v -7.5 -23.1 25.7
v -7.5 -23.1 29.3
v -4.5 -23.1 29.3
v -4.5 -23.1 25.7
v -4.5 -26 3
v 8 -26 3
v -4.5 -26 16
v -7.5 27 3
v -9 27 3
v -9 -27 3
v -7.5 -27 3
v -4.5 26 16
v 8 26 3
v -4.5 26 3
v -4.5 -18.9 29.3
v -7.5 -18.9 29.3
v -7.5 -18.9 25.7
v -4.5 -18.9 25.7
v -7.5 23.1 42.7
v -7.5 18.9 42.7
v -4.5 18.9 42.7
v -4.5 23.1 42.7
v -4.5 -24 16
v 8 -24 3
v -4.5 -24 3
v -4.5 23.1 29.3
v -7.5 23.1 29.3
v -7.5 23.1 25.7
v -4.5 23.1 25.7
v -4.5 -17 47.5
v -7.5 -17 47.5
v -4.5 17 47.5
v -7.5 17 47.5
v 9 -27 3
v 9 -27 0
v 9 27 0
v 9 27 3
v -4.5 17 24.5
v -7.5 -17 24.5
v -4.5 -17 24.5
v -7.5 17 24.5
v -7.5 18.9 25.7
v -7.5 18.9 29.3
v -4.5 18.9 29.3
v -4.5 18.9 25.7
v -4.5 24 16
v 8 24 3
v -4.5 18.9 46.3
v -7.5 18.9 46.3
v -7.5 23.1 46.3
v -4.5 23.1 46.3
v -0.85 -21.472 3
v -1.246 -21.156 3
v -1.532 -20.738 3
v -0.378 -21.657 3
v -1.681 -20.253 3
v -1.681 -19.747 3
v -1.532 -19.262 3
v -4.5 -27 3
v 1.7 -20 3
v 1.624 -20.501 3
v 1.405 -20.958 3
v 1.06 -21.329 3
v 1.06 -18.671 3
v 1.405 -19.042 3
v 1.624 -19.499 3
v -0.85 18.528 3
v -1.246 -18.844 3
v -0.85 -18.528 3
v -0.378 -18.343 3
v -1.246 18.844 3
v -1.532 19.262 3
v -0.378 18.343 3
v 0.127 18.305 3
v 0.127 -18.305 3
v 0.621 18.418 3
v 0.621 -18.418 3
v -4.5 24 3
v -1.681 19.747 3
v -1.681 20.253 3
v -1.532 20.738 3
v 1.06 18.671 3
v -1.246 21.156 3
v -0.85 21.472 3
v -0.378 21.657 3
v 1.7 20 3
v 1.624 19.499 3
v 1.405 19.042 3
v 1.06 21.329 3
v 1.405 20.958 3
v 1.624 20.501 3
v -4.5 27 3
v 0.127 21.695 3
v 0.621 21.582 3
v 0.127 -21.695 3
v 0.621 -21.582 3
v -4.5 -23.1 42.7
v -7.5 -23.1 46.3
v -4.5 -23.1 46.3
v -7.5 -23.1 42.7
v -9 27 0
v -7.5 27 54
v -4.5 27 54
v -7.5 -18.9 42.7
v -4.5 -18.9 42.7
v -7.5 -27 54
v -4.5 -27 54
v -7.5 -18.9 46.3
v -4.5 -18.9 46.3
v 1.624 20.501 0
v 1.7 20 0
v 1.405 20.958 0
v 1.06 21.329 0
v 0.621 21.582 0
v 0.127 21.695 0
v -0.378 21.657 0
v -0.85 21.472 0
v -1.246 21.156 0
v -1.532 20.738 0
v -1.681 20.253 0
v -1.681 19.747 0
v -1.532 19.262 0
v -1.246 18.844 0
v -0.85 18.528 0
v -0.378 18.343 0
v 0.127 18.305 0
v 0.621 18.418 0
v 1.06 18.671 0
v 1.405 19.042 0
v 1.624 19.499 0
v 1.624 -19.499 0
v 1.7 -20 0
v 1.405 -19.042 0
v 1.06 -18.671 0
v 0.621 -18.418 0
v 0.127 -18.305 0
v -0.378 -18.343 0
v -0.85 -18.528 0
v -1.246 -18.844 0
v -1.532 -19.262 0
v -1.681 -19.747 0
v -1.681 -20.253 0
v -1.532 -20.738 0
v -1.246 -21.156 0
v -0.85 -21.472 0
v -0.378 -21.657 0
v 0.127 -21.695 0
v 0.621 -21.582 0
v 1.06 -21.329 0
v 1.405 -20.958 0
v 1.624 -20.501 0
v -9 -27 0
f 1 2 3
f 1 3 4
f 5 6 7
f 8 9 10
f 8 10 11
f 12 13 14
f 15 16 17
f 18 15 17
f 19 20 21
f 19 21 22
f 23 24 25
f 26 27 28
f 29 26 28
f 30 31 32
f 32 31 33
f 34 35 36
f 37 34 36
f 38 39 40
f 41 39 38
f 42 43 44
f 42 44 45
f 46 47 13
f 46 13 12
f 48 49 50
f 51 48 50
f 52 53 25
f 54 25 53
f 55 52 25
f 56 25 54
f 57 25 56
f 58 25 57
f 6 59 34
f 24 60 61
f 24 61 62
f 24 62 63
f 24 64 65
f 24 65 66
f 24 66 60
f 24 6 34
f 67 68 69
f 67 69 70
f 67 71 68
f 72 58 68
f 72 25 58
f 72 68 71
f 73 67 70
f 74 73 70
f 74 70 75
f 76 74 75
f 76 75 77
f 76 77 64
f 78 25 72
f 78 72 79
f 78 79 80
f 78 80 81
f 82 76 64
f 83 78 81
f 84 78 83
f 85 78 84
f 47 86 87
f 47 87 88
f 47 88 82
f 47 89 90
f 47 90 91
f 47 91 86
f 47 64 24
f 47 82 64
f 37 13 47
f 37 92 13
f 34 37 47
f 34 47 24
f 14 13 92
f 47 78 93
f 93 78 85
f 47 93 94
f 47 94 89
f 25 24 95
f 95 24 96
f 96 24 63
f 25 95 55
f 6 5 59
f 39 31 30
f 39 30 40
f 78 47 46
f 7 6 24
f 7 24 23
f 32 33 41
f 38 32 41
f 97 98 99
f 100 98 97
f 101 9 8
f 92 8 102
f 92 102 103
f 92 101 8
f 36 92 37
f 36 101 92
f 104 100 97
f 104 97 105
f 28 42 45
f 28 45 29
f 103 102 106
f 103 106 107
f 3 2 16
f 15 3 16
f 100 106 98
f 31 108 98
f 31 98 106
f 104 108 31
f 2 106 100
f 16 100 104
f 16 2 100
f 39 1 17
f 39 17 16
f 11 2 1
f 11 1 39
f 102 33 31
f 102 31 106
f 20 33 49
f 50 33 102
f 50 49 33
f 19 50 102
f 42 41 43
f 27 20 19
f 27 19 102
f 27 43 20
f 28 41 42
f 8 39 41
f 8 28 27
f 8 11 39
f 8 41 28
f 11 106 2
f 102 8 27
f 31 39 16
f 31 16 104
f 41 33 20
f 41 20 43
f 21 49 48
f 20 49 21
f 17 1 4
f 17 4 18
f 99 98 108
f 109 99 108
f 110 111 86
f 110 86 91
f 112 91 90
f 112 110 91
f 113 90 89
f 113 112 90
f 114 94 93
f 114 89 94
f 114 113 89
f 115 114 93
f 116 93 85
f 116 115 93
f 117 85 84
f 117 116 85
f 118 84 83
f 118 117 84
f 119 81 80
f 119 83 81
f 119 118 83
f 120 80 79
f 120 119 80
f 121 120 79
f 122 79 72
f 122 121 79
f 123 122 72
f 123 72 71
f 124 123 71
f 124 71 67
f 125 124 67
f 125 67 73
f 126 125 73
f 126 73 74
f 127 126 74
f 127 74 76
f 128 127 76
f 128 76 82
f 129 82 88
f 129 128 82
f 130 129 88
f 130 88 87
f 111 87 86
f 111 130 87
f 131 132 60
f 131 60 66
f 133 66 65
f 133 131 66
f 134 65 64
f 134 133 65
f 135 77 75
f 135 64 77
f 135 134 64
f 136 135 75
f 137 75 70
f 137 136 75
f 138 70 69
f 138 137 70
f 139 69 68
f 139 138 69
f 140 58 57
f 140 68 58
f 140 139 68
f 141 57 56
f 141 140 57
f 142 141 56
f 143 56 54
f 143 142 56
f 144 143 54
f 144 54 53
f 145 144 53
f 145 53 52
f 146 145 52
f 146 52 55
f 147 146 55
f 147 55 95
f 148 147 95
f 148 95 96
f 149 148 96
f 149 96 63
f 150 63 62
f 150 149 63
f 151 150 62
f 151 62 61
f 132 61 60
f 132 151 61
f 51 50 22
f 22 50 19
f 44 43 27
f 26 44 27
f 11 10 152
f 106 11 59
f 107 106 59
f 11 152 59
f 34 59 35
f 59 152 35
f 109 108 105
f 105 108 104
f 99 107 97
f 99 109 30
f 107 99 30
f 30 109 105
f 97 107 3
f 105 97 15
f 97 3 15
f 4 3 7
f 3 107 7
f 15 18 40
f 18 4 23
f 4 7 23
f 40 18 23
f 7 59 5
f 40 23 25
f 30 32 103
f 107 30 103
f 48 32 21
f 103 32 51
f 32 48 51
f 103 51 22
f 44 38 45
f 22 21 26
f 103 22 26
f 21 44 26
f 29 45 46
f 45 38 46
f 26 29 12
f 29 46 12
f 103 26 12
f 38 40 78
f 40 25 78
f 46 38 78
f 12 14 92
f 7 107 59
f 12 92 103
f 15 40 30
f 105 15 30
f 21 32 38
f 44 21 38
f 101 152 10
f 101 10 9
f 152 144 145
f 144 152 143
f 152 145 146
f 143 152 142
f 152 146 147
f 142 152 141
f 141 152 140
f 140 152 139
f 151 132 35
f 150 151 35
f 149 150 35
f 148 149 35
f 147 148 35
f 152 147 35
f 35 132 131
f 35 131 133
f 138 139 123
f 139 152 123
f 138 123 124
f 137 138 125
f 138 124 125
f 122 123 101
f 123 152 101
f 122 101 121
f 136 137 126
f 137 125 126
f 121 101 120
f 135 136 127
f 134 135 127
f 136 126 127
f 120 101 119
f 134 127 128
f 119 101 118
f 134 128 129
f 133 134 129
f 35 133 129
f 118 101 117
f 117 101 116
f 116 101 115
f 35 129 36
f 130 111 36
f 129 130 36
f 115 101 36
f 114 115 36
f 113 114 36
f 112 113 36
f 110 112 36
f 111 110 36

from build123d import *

# Parameters (mm, degrees)
SKETCH_1_W                         = 18
SKETCH_1_H                         = 54
FOOT_DEPTH                         = 3
UPRIGHT_START                      = 3
SKETCH_2_W                         = 3
SKETCH_2_H                         = 54
UPRIGHT_DEPTH                      = 51
REAR_COMPONENTS_OPEN_WINDOW_START  = -8
SKETCH_3_W                         = 23
SKETCH_3_H                         = 34
REAR_COMPONENTS_OPEN_WINDOW_DEPTH  = 5
SENSOR_M2_SLOTS_CENTRES42X17_START = -8
SKETCH_4_W                         = 3.6
SKETCH_4_H                         = 4.2
SENSOR_M2_SLOTS_CENTRES42X17_DEPTH = 5
SIDE_GUSSET_START                  = -26
SIDE_GUSSET_DEPTH                  = 2
EXTRUDE_START                      = 24
EXTRUDE_4_DEPTH                    = 2
FOOT_M3_HOLES_PITCH40_START        = -0.1
SKETCH_7_R                         = 1.7
FOOT_M3_HOLES_PITCH40_DEPTH        = 3.2


with BuildPart() as part:
    # 草图1 → Foot (new body)
    with BuildSketch(Plane.XY):
        Rectangle(SKETCH_1_W, SKETCH_1_H)
    extrude(amount=FOOT_DEPTH)

    # 草图2 → Upright (add)
    with BuildSketch(Plane.XY.offset(UPRIGHT_START)):
        with Locations((-6, 0)):
            Rectangle(SKETCH_2_W, SKETCH_2_H)
    extrude(amount=UPRIGHT_DEPTH)

    # 草图3 → Rear_components_open_window (cut)
    with BuildSketch(Plane(origin=(0, 0, 0), x_dir=(0, 0, -1), z_dir=(1, 0, 0)).offset(REAR_COMPONENTS_OPEN_WINDOW_START)):
        with Locations((-36, 0)):
            Rectangle(SKETCH_3_W, SKETCH_3_H)
    extrude(amount=REAR_COMPONENTS_OPEN_WINDOW_DEPTH, mode=Mode.SUBTRACT)

    # 草图4 → Sensor_M2_slots_centres42x17 (cut)
    with BuildSketch(Plane(origin=(0, 0, 0), x_dir=(0, 0, -1), z_dir=(1, 0, 0)).offset(SENSOR_M2_SLOTS_CENTRES42X17_START)):
        with Locations((-27.5, -21)):
            Rectangle(SKETCH_4_W, SKETCH_4_H)
        with Locations((-44.5, -21)):
            Rectangle(SKETCH_4_W, SKETCH_4_H)
        with Locations((-27.5, 21)):
            Rectangle(SKETCH_4_W, SKETCH_4_H)
        with Locations((-44.5, 21)):
            Rectangle(SKETCH_4_W, SKETCH_4_H)
    extrude(amount=SENSOR_M2_SLOTS_CENTRES42X17_DEPTH, mode=Mode.SUBTRACT)

    # 草图5 → Side_gusset (add)
    with BuildSketch(Plane(origin=(0, 0, 0), x_dir=(1, 0, 0), z_dir=(0, 1, 0)).offset(SIDE_GUSSET_START)):
        Polygon((-4.5, -3), (8, -3), (-4.5, -16), align=None)
    extrude(amount=SIDE_GUSSET_DEPTH)

    # 草图6 → 凸台-拉伸4 (add)
    with BuildSketch(Plane(origin=(0, 0, 0), x_dir=(1, 0, 0), z_dir=(0, 1, 0)).offset(EXTRUDE_START)):
        Polygon((-4.5, -3), (8, -3), (-4.5, -16), align=None)
    extrude(amount=EXTRUDE_4_DEPTH)

    # 草图7 → Foot_M3_holes_pitch40 (cut)
    with BuildSketch(Plane.XY.offset(FOOT_M3_HOLES_PITCH40_START)):
        with Locations((0, -20)):
            Circle(SKETCH_7_R)
        with Locations((0, 20)):
            Circle(SKETCH_7_R)
    extrude(amount=FOOT_M3_HOLES_PITCH40_DEPTH, mode=Mode.SUBTRACT)


solid = part.part
